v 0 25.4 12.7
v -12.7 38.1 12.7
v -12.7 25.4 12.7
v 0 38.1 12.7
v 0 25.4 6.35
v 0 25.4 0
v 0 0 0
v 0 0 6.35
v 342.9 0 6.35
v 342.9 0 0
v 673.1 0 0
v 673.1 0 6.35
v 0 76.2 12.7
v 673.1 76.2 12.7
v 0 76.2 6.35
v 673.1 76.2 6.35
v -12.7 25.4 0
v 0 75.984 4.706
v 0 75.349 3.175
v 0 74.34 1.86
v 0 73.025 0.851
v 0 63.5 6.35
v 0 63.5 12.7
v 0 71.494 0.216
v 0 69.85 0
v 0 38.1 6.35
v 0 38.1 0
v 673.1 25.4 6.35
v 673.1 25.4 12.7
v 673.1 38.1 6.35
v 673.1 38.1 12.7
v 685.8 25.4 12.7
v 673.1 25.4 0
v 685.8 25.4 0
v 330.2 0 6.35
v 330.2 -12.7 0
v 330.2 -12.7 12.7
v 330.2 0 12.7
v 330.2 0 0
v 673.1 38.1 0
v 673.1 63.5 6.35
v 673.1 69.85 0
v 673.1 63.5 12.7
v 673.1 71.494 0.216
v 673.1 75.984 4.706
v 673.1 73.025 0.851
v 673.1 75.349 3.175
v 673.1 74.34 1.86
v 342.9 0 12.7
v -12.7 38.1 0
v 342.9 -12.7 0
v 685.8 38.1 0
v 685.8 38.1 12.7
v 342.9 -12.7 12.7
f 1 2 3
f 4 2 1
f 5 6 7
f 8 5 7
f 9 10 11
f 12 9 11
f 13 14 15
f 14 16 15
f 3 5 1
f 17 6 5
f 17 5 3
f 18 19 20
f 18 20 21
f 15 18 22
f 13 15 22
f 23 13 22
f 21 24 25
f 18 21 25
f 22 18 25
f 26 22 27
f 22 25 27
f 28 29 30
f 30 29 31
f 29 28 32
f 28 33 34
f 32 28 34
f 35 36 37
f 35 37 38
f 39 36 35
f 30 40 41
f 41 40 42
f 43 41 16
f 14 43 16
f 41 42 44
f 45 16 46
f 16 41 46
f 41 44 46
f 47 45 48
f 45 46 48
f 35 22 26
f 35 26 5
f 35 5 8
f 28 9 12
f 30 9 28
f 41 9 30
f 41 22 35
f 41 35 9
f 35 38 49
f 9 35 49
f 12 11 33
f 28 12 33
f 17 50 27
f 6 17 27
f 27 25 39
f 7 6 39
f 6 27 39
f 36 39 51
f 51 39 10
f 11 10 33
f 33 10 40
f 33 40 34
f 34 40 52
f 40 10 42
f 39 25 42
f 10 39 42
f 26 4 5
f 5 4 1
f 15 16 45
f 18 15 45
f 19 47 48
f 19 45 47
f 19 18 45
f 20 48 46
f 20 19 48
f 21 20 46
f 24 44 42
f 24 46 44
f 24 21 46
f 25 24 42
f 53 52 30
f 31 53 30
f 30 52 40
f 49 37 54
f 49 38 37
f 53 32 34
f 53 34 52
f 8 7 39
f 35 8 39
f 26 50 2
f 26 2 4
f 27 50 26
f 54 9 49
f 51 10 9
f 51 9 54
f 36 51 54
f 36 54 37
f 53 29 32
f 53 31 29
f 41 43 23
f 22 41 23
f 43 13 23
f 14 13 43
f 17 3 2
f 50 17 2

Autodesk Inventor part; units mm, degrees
ref_plane "YZ Plane" through (0, 0, 0) normal (1, 0, 0) x (0, 1, 0)
ref_plane "XZ Plane" through (0, 0, 0) normal (0, 1, 0) x (-1, 0, 0)
ref_plane "XY Plane" through (0, 0, 0) normal (0, 0, 1) x (1, 0, 0)
sketch "Sketch1" plane through (0, 0, 0) normal (0, 0, 1) x (1, 0, 0)
  line L0 (673.1, 76.2) -> (0, 76.2)
  line L1 (0, 25.4) -> (-12.7, 25.4)
  line L2 (-12.7, 25.4) -> (-12.7, 38.1)
  line L3 (-12.7, 38.1) -> (0, 38.1)
  line L4 (0, 76.2) -> (0, 38.1)
  line L5 (0, 25.4) -> (0, 0)
  line L6 (336.55, 12.7) -> (336.55, 76.2) construction
  line L7 (673.1, 25.4) -> (685.8, 25.4)
  line L8 (685.8, 25.4) -> (685.8, 38.1)
  line L9 (685.8, 38.1) -> (673.1, 38.1)
  line L10 (673.1, 0) -> (673.1, 25.4)
  line L11 (673.1, 38.1) -> (673.1, 76.2)
  line L12 (342.9, -12.7) -> (330.2, -12.7)
  line L13 (330.2, -12.7) -> (330.2, 0)
  line L14 (342.9, 0) -> (342.9, -12.7)
  line L15 (330.2, 0) -> (342.9, 0) construction
  line L16 (336.55, 0) -> (336.55, -12.7) construction
  line L17 (0, 0) -> (330.2, 0)
  line L18 (342.9, 0) -> (673.1, 0)
  point P0 (0, 34.925)
  point P1 (673.1, 34.925)
  dimension "d0" = 673.1
  dimension "d1" = 76.2
  dimension "d9" = 12.7
  dimension "d12" = 12.7
  dimension "d16" = 12.7
  dimension "d17" = 25.4
  dimension "d19" = 25.4
extrude "Extrusion1" add sketch "Sketch1" along normal blind 12.7
sketch "Sketch2" plane through (0, 0, 12.7) normal (0, 0, 1) x (1, 0, 0)
  line L0 (0, 0) -> (673.1, 0)
  line L1 (673.1, 0) -> (673.1, 63.5)
  line L2 (673.1, 63.5) -> (0, 63.5)
  line L3 (0, 63.5) -> (0, 0)
  dimension "d4" = 673.1
  dimension "d5" = 63.5
extrude "Extrusion2" cut sketch "Sketch2" against normal blind 6.35
fillet "Fillet1" radius 6.35 1 edges at (336.55, 76.2, 0)
equation "\"d19\" = d17"
properties part number "Arm Side" material "PVC-Piping"
